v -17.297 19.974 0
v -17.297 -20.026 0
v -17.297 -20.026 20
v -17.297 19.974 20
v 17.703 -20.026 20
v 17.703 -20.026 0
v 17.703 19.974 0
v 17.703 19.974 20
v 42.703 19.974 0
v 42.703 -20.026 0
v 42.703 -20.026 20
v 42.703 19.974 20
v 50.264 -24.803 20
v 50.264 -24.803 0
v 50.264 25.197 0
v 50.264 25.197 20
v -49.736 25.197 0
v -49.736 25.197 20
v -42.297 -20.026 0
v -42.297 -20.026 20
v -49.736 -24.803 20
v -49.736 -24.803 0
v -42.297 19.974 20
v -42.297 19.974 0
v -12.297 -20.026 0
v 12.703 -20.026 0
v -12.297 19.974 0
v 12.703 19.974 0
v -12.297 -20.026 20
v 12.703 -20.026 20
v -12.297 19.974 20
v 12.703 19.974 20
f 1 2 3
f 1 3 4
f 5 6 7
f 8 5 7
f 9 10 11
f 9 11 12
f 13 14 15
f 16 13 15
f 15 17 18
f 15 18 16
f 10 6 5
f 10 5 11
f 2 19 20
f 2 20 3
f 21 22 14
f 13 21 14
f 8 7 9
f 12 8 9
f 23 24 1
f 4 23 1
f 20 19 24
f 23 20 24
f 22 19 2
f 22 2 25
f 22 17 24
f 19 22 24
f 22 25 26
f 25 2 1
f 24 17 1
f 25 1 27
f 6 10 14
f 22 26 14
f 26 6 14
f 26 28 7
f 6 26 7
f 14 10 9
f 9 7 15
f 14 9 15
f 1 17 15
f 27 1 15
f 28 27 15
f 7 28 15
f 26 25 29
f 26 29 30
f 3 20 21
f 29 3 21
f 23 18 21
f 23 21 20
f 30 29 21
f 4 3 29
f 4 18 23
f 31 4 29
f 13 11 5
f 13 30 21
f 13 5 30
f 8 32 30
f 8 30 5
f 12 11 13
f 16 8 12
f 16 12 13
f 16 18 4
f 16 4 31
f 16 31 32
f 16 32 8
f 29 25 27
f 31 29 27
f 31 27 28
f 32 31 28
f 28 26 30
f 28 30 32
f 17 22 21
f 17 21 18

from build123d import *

# Parameters (mm, degrees)
SKETCH_W   = 100
SKETCH_H   = 50
SKETCH_W_2 = 25
SKETCH_H_2 = 40
PAD_DEPTH  = 20


with BuildPart() as part:
    # Sketch → Pad (new body)
    with BuildSketch(Plane.XY):
        with Locations((0.264387, 0.19665)):
            Rectangle(SKETCH_W, SKETCH_H)
        with Locations((-29.796774, -0.02574)):
            Rectangle(SKETCH_W_2, SKETCH_H_2, mode=Mode.SUBTRACT)
        with Locations((0.203226, -0.02574)):
            Rectangle(SKETCH_W_2, SKETCH_H_2, mode=Mode.SUBTRACT)
        with Locations((30.203226, -0.02574)):
            Rectangle(SKETCH_W_2, SKETCH_H_2, mode=Mode.SUBTRACT)
    extrude(amount=PAD_DEPTH)


solid = part.part
